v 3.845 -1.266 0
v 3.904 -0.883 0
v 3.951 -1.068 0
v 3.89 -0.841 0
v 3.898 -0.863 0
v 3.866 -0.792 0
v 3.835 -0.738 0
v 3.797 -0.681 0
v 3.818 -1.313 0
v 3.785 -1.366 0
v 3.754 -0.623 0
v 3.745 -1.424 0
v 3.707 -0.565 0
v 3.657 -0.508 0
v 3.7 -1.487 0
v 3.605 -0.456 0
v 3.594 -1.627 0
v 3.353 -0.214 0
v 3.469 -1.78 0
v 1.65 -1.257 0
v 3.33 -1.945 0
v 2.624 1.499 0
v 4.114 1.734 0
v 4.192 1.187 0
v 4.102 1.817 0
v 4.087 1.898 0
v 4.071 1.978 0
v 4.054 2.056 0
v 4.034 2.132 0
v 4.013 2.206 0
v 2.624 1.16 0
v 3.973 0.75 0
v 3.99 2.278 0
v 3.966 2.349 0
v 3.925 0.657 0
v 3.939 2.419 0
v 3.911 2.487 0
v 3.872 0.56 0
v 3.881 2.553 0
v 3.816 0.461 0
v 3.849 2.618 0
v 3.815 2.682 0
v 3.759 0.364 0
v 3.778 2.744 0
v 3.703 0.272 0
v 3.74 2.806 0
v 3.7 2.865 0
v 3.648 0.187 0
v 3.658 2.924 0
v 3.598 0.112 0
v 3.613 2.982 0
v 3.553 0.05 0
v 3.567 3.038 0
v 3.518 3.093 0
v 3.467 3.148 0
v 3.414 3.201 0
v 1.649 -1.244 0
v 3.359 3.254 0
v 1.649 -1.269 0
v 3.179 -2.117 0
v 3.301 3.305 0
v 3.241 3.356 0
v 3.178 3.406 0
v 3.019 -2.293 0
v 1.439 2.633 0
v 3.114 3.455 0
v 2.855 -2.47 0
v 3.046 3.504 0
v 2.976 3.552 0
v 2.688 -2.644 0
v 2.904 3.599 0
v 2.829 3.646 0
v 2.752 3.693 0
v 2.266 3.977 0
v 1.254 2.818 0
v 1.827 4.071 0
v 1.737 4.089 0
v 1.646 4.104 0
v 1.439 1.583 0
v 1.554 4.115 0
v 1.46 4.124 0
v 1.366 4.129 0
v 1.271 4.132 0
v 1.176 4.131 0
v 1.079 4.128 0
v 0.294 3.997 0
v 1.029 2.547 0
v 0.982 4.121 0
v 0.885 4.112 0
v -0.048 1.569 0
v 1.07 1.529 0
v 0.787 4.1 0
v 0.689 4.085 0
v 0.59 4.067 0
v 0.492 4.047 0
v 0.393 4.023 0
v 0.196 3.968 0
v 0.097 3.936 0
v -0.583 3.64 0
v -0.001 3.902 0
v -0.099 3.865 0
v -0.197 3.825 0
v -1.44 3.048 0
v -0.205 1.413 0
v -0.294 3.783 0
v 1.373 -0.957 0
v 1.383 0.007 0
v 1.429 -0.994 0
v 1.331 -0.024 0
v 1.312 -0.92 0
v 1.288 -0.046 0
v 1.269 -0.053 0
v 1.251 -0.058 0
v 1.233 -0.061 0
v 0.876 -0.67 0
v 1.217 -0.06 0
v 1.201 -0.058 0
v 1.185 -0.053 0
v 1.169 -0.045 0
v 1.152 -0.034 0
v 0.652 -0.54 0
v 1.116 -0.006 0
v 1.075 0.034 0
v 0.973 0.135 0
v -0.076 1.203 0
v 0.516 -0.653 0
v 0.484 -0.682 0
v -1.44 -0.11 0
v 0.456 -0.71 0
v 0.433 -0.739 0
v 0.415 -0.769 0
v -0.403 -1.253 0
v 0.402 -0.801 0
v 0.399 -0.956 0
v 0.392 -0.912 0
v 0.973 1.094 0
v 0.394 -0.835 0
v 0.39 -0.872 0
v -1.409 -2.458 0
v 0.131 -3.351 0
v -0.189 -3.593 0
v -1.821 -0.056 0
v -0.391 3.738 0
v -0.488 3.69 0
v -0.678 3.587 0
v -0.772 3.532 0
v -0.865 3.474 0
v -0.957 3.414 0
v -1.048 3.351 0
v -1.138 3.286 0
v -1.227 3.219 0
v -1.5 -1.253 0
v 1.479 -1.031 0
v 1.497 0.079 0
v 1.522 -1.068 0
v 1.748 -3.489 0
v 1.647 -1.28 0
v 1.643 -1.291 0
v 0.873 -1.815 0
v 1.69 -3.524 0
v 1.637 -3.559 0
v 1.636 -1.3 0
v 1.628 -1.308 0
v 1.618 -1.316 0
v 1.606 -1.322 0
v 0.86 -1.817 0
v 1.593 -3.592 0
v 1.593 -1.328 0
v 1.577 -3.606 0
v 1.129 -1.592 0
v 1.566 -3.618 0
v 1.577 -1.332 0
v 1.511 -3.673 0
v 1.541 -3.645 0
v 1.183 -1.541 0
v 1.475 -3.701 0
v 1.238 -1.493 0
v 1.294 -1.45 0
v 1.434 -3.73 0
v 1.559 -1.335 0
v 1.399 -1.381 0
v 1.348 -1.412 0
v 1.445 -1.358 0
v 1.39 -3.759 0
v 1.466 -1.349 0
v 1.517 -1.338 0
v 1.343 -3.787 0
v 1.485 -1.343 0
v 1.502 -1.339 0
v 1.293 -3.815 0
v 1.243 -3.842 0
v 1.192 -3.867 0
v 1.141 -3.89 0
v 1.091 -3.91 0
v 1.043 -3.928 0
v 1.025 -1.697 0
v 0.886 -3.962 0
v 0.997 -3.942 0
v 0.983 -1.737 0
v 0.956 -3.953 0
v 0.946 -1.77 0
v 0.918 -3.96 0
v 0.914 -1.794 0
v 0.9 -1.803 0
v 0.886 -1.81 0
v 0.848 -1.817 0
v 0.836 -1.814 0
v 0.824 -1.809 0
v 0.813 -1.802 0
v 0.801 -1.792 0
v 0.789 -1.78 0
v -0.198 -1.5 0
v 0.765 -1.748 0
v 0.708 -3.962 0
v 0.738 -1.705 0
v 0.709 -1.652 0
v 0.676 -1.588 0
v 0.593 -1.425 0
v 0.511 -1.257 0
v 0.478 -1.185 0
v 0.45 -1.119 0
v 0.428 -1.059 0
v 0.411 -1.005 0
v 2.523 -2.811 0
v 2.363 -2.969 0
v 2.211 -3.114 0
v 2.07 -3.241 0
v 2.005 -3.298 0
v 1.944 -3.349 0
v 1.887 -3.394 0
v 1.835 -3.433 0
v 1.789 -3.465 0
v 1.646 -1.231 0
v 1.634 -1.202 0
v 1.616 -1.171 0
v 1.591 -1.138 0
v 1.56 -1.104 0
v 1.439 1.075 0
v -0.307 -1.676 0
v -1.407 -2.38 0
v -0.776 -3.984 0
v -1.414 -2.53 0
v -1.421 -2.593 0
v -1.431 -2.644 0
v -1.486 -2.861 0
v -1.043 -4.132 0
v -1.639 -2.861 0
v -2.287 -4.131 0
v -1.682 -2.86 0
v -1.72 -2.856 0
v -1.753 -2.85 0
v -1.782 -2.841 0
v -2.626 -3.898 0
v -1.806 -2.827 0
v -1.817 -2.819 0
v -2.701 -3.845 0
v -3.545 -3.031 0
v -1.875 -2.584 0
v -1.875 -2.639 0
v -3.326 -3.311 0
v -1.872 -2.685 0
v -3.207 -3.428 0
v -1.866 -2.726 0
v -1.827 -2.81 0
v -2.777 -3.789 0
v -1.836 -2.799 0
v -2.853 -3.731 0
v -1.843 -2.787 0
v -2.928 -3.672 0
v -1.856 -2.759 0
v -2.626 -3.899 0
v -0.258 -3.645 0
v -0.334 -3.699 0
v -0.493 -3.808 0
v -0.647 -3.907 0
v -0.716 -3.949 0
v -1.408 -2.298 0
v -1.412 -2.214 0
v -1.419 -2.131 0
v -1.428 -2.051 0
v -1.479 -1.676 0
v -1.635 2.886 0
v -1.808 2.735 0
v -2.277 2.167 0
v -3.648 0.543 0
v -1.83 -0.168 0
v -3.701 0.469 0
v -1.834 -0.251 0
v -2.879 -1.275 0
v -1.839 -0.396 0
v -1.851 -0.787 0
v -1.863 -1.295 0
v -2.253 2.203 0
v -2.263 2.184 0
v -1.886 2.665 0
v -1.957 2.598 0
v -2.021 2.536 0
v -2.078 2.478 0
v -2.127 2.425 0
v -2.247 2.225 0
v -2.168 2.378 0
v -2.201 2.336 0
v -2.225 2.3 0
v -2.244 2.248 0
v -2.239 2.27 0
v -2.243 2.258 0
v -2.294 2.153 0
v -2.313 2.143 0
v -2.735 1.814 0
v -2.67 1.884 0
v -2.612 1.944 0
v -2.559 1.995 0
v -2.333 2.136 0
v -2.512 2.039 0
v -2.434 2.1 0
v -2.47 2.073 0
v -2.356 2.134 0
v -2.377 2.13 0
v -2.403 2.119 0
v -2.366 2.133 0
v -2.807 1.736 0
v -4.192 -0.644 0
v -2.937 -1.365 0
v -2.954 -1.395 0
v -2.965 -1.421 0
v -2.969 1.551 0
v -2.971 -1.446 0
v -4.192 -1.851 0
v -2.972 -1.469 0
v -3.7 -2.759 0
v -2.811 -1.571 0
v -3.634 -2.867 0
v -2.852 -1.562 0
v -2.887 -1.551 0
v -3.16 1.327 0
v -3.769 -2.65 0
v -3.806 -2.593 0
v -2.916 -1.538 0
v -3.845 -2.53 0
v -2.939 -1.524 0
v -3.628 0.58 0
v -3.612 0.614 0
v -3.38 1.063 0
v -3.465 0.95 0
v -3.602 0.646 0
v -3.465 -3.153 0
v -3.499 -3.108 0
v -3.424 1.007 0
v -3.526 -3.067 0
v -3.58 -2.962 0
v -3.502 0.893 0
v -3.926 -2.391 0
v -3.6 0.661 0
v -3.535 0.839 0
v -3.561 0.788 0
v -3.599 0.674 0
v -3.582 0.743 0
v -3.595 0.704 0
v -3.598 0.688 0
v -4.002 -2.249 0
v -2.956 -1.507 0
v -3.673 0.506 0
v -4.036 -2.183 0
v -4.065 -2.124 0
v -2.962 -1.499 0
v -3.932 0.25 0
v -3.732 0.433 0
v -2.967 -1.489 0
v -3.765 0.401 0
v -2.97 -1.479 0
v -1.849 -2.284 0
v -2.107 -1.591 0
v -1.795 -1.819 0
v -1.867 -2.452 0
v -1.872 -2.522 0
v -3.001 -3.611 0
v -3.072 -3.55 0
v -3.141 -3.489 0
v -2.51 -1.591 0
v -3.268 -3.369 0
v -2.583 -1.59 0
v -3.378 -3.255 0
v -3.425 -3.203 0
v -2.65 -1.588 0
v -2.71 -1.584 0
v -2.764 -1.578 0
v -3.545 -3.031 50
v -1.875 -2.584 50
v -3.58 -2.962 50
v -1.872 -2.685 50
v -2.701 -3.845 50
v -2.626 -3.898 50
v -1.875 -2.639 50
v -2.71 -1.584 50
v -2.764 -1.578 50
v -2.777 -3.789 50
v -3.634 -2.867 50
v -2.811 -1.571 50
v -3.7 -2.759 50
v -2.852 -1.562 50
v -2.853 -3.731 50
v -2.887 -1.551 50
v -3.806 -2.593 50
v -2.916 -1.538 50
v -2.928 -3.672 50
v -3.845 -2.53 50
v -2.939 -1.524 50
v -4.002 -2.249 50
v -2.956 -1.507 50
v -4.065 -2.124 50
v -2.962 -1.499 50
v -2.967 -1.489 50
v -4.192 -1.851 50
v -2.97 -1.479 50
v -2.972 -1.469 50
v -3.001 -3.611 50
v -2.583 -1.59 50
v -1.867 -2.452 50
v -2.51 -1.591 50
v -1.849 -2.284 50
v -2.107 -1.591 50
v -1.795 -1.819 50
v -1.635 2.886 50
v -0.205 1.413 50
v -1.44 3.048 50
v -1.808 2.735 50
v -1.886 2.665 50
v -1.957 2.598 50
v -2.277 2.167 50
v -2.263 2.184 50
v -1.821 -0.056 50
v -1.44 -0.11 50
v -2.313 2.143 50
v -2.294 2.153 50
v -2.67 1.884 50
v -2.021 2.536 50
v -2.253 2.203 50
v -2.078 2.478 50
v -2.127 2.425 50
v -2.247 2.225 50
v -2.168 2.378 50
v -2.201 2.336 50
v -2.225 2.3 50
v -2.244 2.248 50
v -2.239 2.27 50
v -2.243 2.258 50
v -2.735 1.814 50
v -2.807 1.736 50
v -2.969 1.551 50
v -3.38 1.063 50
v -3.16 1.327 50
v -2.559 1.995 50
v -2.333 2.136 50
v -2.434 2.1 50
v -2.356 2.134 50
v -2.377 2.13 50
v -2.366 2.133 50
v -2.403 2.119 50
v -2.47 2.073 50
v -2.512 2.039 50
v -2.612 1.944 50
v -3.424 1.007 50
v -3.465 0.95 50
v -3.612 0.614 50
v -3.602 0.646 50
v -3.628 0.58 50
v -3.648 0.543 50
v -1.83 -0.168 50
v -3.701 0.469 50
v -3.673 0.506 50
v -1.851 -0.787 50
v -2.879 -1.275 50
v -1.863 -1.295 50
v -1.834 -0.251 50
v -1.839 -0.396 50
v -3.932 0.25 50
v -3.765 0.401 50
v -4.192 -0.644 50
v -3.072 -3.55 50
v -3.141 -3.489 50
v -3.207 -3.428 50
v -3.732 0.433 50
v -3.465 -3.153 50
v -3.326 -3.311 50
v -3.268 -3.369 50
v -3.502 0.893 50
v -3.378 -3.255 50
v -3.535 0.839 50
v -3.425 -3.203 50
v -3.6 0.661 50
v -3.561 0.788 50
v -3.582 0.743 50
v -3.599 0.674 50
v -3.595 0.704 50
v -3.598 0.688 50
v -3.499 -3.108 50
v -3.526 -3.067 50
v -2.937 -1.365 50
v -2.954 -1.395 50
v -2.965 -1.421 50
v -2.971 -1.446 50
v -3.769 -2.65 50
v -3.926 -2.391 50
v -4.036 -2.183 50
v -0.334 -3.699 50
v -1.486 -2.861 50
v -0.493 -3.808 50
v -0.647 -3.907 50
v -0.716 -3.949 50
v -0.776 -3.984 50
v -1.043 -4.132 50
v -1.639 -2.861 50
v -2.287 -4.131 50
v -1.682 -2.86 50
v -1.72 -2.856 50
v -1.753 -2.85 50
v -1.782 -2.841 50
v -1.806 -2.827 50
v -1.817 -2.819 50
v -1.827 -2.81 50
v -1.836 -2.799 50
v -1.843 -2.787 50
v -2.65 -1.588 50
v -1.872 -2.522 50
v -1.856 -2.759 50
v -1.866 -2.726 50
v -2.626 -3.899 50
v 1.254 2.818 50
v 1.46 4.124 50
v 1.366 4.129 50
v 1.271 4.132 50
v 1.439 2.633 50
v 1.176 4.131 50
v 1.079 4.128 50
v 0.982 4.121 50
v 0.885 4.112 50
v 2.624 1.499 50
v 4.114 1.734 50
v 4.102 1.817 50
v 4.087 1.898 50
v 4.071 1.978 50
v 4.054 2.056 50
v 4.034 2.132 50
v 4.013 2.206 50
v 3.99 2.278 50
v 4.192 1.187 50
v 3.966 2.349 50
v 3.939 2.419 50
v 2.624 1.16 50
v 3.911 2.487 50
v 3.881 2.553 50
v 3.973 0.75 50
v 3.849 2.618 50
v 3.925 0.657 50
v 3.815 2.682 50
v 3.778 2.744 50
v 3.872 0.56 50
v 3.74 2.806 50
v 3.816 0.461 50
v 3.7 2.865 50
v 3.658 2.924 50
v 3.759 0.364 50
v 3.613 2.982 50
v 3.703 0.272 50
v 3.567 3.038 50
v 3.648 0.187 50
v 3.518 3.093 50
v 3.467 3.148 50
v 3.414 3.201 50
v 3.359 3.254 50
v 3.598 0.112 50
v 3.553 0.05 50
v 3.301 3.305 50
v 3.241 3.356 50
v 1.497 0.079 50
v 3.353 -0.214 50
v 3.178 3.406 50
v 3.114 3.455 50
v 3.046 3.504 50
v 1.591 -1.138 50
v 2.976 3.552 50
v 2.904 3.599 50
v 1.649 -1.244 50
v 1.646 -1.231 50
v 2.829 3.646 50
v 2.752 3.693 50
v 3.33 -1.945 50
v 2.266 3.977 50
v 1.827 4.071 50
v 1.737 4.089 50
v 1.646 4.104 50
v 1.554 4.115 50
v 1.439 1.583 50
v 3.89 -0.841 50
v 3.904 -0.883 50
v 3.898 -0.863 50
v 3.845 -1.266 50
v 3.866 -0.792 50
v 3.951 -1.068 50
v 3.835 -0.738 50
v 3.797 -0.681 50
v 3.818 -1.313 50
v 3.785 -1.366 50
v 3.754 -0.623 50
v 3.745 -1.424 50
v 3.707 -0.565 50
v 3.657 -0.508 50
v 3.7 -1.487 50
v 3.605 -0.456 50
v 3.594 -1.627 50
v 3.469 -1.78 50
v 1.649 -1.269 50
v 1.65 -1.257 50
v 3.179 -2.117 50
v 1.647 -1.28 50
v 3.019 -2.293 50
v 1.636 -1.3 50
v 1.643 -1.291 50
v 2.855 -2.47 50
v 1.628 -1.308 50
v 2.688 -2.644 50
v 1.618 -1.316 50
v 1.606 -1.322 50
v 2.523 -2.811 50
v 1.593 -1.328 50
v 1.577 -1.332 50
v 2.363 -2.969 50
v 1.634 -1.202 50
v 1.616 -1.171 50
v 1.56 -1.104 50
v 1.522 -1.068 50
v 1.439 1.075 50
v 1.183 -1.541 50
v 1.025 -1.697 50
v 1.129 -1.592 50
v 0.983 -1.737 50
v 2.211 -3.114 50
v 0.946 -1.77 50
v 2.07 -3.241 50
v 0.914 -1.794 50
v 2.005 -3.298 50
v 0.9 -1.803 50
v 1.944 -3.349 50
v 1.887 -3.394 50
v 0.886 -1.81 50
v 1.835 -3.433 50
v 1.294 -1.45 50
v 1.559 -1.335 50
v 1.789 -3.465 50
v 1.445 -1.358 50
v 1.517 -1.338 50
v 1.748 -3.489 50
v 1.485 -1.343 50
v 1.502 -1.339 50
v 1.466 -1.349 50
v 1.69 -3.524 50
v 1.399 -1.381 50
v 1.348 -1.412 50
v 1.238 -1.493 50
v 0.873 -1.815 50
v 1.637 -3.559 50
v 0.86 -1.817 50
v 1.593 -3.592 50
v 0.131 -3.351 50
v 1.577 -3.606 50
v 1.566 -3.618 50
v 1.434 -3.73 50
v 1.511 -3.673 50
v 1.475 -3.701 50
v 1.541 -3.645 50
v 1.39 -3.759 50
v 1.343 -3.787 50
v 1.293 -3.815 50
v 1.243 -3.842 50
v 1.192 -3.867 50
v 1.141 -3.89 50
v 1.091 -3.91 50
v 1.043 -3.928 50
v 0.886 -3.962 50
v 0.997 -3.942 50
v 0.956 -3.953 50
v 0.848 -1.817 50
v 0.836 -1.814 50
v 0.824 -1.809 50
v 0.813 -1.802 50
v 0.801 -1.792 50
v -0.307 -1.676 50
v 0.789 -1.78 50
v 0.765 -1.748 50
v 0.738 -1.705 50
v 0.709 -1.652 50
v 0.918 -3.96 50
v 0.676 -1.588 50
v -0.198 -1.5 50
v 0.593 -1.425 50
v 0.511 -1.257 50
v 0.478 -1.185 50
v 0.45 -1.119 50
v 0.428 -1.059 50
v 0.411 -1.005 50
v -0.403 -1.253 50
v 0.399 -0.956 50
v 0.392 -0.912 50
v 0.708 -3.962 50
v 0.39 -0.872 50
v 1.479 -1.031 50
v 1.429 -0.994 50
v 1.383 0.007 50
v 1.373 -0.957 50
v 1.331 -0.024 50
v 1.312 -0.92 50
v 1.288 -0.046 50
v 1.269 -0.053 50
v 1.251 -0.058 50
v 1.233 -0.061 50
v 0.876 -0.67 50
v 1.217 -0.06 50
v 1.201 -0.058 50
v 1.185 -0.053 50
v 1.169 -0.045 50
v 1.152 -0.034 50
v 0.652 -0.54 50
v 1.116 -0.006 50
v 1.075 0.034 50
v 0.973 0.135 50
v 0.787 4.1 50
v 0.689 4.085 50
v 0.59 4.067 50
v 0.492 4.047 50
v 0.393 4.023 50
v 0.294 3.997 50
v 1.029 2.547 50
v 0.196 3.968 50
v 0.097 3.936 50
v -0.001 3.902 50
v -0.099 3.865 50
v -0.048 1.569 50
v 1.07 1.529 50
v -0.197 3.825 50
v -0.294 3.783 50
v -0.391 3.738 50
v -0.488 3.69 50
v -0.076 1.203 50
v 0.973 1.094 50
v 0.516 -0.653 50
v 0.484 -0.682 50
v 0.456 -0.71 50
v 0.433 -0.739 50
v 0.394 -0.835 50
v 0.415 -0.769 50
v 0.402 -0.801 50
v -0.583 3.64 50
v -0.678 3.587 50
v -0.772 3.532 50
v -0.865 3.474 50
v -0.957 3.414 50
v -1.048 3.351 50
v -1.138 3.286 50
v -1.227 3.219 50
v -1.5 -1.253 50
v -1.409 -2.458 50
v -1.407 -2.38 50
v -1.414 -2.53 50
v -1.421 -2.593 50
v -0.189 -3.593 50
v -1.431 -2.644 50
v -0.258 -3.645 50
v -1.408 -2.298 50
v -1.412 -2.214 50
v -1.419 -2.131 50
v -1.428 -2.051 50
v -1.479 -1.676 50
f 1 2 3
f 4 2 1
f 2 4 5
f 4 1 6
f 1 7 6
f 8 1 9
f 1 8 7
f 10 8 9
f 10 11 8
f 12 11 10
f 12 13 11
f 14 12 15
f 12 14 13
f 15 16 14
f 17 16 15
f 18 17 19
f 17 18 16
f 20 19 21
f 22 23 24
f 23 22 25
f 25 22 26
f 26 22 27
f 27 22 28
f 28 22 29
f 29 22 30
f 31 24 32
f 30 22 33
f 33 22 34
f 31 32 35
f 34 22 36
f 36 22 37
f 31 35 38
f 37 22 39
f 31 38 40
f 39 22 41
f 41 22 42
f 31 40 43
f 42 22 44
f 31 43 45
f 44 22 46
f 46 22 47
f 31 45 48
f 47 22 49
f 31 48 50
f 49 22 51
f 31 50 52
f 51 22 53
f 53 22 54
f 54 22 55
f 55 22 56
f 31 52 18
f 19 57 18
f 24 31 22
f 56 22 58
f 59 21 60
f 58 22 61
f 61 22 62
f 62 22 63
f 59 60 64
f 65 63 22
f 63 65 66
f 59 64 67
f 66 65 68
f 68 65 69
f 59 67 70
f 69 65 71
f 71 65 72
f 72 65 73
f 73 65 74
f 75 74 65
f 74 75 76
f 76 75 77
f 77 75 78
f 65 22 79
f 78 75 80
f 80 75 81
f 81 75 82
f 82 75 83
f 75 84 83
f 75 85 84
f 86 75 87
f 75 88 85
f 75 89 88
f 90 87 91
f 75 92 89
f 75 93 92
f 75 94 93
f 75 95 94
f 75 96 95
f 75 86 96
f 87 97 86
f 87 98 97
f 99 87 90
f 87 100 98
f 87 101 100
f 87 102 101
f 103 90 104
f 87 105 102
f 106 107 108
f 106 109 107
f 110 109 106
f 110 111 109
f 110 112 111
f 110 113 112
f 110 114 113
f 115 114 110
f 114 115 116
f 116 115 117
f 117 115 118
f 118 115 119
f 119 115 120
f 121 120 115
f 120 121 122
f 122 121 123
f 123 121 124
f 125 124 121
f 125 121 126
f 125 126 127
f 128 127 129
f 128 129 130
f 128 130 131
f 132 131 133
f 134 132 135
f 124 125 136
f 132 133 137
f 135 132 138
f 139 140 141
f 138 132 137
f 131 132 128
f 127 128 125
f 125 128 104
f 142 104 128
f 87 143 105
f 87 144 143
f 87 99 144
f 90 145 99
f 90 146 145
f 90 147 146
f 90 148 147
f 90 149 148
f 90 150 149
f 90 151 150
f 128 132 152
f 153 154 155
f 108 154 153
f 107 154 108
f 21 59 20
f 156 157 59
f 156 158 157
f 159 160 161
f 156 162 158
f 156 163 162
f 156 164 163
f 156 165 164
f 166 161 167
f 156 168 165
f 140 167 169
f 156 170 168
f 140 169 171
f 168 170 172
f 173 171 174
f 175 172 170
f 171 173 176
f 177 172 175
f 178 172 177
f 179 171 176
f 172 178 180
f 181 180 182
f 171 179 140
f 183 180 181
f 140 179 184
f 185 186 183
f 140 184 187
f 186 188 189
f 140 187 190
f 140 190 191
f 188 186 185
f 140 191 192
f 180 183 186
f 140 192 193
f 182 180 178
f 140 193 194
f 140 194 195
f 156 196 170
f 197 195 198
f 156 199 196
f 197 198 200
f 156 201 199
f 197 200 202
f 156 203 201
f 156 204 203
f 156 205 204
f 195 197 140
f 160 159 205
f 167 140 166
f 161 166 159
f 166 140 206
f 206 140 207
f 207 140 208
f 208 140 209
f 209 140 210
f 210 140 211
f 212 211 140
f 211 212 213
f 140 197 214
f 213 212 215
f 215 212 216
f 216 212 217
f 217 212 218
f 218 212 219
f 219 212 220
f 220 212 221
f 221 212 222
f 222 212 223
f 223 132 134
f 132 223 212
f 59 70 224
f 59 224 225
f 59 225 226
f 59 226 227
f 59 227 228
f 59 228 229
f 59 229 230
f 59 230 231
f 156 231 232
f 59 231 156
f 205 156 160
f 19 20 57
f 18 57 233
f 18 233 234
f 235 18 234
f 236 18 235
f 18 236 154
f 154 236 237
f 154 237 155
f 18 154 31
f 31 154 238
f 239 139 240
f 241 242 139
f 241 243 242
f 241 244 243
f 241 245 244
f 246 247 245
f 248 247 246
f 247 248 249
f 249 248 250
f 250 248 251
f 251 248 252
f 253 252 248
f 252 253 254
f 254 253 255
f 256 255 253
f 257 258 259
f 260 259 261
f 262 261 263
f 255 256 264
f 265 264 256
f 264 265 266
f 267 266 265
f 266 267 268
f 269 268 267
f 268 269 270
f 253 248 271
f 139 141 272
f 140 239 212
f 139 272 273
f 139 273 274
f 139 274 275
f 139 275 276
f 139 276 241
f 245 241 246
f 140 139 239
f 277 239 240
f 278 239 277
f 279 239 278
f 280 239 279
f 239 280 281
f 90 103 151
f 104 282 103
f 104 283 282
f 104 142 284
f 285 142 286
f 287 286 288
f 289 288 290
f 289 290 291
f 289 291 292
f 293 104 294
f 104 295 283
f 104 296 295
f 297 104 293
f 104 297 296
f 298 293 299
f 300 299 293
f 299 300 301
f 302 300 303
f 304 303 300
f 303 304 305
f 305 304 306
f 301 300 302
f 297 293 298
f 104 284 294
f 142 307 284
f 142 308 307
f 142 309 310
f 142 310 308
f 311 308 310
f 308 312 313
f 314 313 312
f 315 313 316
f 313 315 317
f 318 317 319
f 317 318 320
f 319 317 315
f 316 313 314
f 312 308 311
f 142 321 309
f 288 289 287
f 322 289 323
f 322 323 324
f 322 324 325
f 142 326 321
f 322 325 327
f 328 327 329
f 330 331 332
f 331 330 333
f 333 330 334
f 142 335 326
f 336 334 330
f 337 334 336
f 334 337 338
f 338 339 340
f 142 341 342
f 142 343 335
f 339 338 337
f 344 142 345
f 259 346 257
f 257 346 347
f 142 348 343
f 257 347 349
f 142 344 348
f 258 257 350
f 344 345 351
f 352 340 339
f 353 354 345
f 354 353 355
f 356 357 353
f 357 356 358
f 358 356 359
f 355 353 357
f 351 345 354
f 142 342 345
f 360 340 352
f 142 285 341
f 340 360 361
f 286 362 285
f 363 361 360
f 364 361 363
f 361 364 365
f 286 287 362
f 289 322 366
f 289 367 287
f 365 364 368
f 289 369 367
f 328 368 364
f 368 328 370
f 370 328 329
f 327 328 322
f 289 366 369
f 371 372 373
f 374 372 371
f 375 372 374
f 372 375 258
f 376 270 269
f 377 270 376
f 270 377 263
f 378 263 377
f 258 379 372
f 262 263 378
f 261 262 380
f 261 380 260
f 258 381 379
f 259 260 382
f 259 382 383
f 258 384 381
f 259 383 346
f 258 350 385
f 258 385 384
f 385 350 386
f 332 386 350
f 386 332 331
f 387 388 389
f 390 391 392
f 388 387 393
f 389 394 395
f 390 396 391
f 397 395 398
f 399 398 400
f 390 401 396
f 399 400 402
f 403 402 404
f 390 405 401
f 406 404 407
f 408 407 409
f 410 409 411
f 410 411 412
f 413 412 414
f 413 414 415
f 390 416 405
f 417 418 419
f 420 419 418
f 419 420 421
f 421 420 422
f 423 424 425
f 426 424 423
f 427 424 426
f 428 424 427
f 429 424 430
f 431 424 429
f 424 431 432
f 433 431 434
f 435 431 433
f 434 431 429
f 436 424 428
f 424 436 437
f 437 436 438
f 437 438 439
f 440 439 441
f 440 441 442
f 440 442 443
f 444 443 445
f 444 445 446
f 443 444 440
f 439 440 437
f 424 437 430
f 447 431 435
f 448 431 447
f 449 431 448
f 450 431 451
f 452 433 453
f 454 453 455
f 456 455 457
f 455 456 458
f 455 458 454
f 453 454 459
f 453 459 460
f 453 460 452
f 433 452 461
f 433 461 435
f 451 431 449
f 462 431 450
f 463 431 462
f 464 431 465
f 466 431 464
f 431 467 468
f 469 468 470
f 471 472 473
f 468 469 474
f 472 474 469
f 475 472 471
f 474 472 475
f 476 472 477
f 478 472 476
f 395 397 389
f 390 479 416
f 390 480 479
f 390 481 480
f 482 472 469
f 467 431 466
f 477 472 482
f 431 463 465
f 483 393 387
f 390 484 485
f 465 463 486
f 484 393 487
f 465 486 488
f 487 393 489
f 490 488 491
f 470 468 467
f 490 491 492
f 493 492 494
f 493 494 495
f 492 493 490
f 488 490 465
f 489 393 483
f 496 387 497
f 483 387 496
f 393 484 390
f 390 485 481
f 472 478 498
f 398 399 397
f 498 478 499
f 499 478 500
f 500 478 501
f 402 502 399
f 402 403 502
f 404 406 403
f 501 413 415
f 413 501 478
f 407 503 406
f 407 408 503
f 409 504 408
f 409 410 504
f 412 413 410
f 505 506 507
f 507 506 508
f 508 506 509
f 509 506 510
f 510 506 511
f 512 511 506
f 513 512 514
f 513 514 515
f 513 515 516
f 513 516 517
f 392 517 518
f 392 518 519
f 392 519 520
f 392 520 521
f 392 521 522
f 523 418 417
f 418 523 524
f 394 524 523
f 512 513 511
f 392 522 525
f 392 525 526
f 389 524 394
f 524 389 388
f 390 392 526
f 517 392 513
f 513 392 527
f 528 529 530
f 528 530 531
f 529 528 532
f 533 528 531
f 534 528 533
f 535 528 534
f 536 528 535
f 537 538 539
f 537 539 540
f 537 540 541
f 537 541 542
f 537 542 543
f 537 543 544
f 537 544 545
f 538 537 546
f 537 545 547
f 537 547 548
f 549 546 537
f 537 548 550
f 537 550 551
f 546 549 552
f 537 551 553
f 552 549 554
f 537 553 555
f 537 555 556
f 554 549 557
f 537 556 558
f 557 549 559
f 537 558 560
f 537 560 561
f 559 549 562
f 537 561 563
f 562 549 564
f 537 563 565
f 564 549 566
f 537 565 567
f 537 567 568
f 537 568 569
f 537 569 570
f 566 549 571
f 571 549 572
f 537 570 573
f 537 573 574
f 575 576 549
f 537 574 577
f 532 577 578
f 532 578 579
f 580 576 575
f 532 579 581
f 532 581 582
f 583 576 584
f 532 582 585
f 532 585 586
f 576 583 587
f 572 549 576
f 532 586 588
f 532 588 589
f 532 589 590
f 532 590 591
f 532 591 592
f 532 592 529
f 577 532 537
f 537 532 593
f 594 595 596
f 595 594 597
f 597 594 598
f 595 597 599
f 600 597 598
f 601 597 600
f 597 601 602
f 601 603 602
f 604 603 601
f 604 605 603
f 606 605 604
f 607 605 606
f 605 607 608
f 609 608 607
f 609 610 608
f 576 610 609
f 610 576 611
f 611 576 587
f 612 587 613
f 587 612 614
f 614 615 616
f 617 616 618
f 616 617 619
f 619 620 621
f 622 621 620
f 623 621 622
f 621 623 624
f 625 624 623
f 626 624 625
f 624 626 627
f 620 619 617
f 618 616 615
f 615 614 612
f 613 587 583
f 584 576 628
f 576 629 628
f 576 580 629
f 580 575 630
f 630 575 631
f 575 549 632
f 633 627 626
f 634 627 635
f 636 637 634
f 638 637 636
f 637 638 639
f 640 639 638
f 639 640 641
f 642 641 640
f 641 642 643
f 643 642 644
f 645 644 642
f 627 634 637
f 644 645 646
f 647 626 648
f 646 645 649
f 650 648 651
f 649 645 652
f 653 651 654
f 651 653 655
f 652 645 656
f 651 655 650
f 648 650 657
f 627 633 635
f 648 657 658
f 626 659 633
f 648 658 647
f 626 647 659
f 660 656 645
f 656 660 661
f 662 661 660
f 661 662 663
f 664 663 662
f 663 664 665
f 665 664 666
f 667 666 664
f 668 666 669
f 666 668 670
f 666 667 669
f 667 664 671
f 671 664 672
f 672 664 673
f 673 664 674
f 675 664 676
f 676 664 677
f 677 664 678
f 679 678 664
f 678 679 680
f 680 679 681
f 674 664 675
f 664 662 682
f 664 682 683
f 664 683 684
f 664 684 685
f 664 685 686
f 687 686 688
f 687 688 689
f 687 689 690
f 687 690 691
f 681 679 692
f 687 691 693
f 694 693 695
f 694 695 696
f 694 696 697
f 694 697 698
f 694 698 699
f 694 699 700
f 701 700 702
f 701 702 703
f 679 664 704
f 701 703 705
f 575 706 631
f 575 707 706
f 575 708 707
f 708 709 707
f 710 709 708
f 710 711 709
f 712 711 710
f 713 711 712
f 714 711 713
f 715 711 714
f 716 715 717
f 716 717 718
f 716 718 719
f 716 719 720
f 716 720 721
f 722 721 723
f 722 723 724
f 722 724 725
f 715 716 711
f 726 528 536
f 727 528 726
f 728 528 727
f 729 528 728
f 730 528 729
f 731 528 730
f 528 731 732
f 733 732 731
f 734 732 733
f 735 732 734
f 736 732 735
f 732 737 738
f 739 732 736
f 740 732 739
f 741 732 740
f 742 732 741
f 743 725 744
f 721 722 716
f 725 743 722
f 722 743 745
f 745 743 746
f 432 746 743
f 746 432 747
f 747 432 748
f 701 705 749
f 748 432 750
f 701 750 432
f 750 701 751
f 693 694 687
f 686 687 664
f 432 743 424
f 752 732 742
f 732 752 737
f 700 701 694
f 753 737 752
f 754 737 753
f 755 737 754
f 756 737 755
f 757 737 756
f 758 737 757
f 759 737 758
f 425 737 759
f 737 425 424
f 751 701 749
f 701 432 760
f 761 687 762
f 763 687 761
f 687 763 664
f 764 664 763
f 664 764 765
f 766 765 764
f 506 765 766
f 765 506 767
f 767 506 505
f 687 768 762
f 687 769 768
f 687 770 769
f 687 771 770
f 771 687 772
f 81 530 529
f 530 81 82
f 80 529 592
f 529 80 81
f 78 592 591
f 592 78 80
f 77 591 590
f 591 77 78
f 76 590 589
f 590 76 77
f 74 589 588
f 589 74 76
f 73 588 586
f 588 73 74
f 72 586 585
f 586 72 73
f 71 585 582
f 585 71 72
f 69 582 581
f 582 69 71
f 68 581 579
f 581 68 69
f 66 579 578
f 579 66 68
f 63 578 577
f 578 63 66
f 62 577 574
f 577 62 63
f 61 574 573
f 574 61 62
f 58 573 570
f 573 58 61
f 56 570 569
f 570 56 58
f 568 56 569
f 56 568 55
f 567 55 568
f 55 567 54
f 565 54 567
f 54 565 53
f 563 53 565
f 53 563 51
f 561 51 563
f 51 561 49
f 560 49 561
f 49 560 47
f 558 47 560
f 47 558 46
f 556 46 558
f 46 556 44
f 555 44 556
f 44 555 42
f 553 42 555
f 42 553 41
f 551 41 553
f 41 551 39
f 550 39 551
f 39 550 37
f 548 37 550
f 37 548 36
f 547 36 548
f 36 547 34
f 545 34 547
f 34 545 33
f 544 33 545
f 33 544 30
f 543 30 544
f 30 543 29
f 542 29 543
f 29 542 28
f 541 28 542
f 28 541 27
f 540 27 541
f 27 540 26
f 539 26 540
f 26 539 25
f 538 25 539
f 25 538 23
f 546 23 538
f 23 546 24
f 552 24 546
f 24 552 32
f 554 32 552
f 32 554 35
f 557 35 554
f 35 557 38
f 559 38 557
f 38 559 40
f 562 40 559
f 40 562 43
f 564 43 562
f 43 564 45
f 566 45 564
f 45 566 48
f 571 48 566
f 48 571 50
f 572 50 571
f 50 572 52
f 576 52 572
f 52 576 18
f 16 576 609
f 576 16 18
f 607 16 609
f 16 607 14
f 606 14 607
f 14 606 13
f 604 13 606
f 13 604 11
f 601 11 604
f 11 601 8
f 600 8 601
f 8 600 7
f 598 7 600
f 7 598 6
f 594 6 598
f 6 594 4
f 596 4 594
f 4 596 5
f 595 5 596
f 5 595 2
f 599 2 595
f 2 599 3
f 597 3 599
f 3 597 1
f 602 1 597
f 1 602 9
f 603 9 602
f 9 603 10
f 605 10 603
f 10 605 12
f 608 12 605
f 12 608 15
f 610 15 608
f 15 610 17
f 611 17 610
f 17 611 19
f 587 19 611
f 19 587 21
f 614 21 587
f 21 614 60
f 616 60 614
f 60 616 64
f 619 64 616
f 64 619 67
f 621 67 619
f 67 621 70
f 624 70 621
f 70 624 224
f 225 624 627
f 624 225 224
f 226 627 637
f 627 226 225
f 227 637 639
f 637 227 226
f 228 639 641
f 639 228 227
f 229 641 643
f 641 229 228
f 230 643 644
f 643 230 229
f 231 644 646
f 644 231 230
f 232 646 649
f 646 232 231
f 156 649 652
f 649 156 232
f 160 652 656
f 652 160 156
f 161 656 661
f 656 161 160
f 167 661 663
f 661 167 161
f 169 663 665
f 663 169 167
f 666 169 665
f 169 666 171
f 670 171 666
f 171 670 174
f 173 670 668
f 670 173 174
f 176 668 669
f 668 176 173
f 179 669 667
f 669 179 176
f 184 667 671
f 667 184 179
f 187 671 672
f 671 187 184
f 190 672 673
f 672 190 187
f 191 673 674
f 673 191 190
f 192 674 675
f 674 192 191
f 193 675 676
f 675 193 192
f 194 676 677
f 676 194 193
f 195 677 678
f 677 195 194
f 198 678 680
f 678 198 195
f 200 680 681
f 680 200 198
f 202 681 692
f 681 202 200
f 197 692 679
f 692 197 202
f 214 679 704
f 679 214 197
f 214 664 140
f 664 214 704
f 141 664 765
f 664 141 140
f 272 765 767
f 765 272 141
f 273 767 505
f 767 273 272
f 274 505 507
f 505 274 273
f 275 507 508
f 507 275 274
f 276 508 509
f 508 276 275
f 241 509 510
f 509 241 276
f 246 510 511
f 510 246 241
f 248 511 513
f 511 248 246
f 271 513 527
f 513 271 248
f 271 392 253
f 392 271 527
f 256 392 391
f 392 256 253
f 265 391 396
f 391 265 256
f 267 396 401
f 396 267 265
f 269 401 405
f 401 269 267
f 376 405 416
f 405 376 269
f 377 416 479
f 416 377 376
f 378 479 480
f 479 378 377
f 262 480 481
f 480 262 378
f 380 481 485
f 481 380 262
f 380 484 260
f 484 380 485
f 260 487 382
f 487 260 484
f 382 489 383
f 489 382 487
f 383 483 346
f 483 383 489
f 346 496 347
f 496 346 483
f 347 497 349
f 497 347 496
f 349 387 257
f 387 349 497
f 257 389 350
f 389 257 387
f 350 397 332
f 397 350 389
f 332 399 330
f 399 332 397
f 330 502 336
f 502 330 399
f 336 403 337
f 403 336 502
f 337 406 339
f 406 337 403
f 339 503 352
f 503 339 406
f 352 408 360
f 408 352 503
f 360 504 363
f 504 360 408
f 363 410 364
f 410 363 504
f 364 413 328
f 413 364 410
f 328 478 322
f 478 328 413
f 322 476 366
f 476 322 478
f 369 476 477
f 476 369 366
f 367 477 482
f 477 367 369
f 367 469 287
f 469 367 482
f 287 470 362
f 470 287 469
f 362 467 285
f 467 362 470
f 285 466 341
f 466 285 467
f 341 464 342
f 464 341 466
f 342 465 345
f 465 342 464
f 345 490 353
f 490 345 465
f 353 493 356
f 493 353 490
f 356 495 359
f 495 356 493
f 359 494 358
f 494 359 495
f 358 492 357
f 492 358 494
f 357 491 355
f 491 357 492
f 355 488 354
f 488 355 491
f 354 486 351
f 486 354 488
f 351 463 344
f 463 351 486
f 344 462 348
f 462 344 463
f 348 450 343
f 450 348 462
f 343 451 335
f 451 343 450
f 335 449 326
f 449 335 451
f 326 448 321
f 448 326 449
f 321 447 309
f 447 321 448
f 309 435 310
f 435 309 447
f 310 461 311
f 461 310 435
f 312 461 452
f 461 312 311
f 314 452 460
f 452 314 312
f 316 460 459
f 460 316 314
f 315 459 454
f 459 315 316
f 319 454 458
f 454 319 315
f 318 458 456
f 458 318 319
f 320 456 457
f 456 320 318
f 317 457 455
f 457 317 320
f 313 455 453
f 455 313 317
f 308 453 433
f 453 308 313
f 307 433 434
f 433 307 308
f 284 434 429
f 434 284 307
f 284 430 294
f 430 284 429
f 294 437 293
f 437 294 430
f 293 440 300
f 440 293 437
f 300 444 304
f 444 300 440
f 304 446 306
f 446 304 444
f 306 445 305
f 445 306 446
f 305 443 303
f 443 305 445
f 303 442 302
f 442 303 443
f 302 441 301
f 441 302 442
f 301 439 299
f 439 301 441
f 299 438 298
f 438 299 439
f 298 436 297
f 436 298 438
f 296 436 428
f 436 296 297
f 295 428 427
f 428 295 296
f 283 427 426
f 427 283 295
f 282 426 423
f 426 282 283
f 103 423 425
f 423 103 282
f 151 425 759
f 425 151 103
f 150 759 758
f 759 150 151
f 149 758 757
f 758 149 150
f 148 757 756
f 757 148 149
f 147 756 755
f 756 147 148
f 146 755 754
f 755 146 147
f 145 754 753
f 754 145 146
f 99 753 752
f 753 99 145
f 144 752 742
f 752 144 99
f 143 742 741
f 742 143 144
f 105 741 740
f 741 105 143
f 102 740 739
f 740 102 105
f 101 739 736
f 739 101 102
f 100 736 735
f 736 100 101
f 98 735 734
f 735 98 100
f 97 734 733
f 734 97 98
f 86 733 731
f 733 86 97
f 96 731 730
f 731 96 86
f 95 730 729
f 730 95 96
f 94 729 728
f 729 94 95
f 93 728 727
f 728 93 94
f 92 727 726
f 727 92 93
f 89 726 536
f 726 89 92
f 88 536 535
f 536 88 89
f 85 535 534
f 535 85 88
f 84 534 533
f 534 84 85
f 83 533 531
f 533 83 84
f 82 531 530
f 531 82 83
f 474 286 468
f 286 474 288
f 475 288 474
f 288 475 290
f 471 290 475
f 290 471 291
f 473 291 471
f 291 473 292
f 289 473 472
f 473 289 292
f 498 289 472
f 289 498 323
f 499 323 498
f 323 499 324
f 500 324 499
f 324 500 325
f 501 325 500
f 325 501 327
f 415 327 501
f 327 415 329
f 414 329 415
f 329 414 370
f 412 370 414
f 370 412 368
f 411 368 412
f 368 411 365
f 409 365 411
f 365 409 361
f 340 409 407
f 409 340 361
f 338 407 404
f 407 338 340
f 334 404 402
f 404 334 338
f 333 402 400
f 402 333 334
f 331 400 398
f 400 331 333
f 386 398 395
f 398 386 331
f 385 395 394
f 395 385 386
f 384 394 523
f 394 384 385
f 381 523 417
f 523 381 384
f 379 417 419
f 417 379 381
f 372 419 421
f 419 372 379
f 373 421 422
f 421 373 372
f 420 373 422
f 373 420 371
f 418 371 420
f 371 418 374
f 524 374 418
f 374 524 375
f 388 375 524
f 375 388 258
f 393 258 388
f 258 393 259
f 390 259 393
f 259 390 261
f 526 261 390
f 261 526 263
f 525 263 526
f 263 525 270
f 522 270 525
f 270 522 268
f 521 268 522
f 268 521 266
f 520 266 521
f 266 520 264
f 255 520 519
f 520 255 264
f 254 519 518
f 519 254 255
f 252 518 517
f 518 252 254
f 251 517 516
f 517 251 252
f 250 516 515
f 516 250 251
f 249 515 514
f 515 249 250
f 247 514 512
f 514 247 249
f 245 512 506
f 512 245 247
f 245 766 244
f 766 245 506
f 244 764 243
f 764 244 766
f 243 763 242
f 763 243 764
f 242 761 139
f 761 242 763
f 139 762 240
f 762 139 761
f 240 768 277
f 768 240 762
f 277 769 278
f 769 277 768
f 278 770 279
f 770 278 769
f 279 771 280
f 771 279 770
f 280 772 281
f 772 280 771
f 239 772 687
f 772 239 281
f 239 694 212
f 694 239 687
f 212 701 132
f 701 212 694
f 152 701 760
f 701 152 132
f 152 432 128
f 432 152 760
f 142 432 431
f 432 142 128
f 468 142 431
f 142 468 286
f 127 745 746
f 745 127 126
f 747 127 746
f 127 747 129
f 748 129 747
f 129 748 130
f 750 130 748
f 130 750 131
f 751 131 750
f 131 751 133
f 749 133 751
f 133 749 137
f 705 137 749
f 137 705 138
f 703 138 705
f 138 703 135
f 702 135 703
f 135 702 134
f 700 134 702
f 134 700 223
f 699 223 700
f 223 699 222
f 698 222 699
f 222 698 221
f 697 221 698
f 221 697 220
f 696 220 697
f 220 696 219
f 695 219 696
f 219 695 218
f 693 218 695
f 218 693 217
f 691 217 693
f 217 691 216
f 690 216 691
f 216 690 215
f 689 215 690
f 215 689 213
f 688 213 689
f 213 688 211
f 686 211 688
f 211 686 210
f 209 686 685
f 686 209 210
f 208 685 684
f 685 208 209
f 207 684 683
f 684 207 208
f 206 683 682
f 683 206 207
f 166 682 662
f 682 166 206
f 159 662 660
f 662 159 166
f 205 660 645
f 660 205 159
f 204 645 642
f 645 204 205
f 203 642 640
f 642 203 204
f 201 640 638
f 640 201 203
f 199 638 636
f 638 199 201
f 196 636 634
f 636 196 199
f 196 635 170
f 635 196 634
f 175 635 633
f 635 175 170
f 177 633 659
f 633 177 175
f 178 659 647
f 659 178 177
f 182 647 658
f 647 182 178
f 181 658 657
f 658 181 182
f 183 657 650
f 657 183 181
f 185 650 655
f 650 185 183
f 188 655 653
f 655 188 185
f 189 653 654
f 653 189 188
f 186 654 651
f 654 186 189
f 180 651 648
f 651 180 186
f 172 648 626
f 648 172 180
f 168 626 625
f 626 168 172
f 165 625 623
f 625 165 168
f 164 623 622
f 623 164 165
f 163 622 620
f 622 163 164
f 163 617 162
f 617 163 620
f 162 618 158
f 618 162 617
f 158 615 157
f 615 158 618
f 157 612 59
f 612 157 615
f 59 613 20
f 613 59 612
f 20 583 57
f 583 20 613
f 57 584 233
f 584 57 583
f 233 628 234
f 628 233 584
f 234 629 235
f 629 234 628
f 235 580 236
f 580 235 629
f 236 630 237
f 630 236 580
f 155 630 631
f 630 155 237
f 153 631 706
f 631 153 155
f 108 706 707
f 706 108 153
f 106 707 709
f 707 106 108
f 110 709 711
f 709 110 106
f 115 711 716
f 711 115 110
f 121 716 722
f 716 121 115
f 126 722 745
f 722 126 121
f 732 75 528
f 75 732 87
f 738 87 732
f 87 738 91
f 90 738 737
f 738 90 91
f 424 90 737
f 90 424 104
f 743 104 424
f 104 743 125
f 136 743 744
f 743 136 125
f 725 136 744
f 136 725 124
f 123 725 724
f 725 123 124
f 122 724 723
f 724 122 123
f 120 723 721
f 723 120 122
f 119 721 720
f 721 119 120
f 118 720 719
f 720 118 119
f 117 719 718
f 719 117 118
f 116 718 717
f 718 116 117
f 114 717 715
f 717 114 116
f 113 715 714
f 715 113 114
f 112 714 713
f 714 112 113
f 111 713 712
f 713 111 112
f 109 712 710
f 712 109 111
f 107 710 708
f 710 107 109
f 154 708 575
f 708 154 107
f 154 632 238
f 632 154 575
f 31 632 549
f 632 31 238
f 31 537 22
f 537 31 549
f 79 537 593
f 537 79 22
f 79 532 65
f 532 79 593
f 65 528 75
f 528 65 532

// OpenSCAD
// Generated by inkscape None + inkscape-paths2openscad 0.27
// Sat Sep 26 10:11:36 2020 from "inkscape.svg"

// Module names are of the form poly_<inkscape-path-id>().  As a result,
// you can associate a polygon in this OpenSCAD program with the corresponding
// SVG element in the Inkscape document by looking for the XML element with
// the attribute id="inkscape-path-id".

// fudge value is used to ensure that subtracted solids are a tad taller
// in the z dimension than the polygon being subtracted from.  This helps
// keep the resulting .stl file manifold.
fudge = 0.1;
user_unit_scale_x = 1.0;
user_unit_scale_y = 1.0;
custom_scale_x = 1;
custom_scale_y = 1;
zsize = 50;
line_fn = 16;
min_line_width = 1.0;
line_width_scale = 1.0;
function min_line_mm(w) = max(min_line_width, w * line_width_scale) * 1;


path971_0_center = [0.000000,0.000000];
path971_0_points = [[-2.625735,3.898504],[-2.701427,3.845299],[-2.777402,3.789395],[-2.853079,3.731343],[-2.927875,3.671690],[-3.001208,3.610988],[-3.072497,3.549784],[-3.141158,3.488629],[-3.206611,3.428070],[-3.268273,3.368659],[-3.325562,3.310943],[-3.377897,3.255473],[-3.424694,3.202797],[-3.465372,3.153465],[-3.499350,3.108026],[-3.526044,3.067029],[-3.544874,3.031024],[-3.579933,2.961691],[-3.633967,2.866737],[-3.699606,2.758676],[-3.769483,2.650024],[-3.805935,2.593440],[-3.844946,2.529903],[-3.925796,2.390607],[-4.002339,2.249409],[-4.035967,2.183495],[-4.064884,2.123584],[-4.191708,1.851134],[-4.191708,1.247614],[-4.191708,0.644090],[-4.061732,0.196988],[-3.931756,-0.250114],[-3.765398,-0.400665],[-3.731979,-0.433413],[-3.700803,-0.468811],[-3.672551,-0.505737],[-3.647907,-0.543070],[-3.627551,-0.579687],[-3.612167,-0.614469],[-3.602436,-0.646293],[-3.599904,-0.660746],[-3.599041,-0.674039],[-3.597902,-0.687931],[-3.594563,-0.704144],[-3.581730,-0.742734],[-3.561442,-0.788213],[-3.534597,-0.838984],[-3.502097,-0.893452],[-3.464840,-0.950022],[-3.423727,-1.007098],[-3.379656,-1.063083],[-3.159823,-1.327475],[-2.969391,-1.551259],[-2.806782,-1.736086],[-2.735418,-1.814406],[-2.670417,-1.883606],[-2.611583,-1.943893],[-2.558718,-1.995471],[-2.511624,-2.038549],[-2.470105,-2.073331],[-2.433963,-2.100025],[-2.403001,-2.118836],[-2.377021,-2.129972],[-2.365838,-2.132726],[-2.355826,-2.133638],[-2.333438,-2.135966],[-2.312551,-2.142637],[-2.293624,-2.153184],[-2.277113,-2.167139],[-2.263475,-2.184035],[-2.253168,-2.203403],[-2.246648,-2.224776],[-2.244373,-2.247687],[-2.243132,-2.258151],[-2.239439,-2.270355],[-2.224891,-2.299800],[-2.201115,-2.335656],[-2.168492,-2.377556],[-2.127408,-2.425134],[-2.078246,-2.478025],[-2.021390,-2.535861],[-1.957224,-2.598277],[-1.886131,-2.664907],[-1.808495,-2.735384],[-1.635131,-2.886417],[-1.440201,-3.048445],[-1.226776,-3.218540],[-1.138062,-3.286146],[-1.048137,-3.351327],[-0.957080,-3.414060],[-0.864969,-3.474325],[-0.771881,-3.532099],[-0.677894,-3.587361],[-0.583085,-3.640090],[-0.487532,-3.690263],[-0.391313,-3.737859],[-0.294505,-3.782856],[-0.197185,-3.825233],[-0.099432,-3.864968],[-0.001323,-3.902039],[0.097065,-3.936424],[0.195653,-3.968102],[0.294365,-3.997052],[0.393122,-4.023251],[0.491847,-4.046678],[0.590463,-4.067311],[0.688892,-4.085128],[0.787056,-4.100108],[0.884877,-4.112230],[0.982278,-4.121471],[1.079182,-4.127810],[1.175511,-4.131225],[1.271187,-4.131694],[1.366132,-4.129196],[1.460270,-4.123710],[1.553522,-4.115212],[1.645810,-4.103683],[1.737058,-4.089100],[1.827187,-4.071441],[2.266407,-3.977241],[2.751947,-3.692673],[2.829325,-3.646331],[2.904139,-3.599487],[2.976421,-3.552096],[3.046202,-3.504113],[3.113515,-3.455491],[3.178391,-3.406184],[3.240863,-3.356148],[3.300962,-3.305335],[3.358720,-3.253701],[3.414169,-3.201199],[3.467340,-3.147783],[3.518266,-3.093409],[3.566979,-3.038029],[3.613510,-2.981599],[3.657891,-2.924072],[3.700154,-2.865403],[3.740331,-2.805546],[3.778453,-2.744454],[3.814553,-2.682083],[3.848663,-2.618387],[3.880814,-2.553319],[3.911038,-2.486834],[3.939367,-2.418886],[3.965832,-2.349429],[3.990467,-2.278418],[4.013302,-2.205806],[4.034369,-2.131549],[4.053701,-2.055599],[4.071329,-1.977912],[4.087285,-1.898441],[4.101600,-1.817141],[4.114307,-1.733966],[4.191707,-1.187393],[3.972647,-0.750347],[3.924552,-0.657173],[3.871772,-0.559848],[3.816029,-0.461247],[3.759044,-0.364243],[3.702537,-0.271709],[3.648230,-0.186521],[3.597843,-0.111551],[3.553097,-0.049673],[3.352597,0.213956],[3.605217,0.455981],[3.656911,0.508374],[3.706968,0.564549],[3.754162,0.622756],[3.797266,0.681243],[3.835055,0.738259],[3.866300,0.792052],[3.889777,0.840872],[3.898218,0.862869],[3.904257,0.882966],[3.950657,1.067924],[3.845197,1.266314],[3.818383,1.313335],[3.784979,1.366141],[3.745395,1.424298],[3.700041,1.487372],[3.593655,1.626537],[3.469095,1.780169],[3.329633,1.944797],[3.178540,2.116954],[3.019090,2.293170],[2.854554,2.469978],[2.688205,2.643908],[2.523316,2.811491],[2.363158,2.969259],[2.211004,3.113743],[2.070127,3.241474],[2.004940,3.297973],[1.943799,3.348984],[1.887113,3.394072],[1.835291,3.432803],[1.788743,3.464745],[1.747878,3.489464],[1.690186,3.523600],[1.636592,3.559290],[1.593072,3.592305],[1.576956,3.606487],[1.565597,3.618414],[1.541134,3.644875],[1.510528,3.672564],[1.474580,3.701077],[1.434092,3.730008],[1.389864,3.758952],[1.342697,3.787504],[1.293392,3.815259],[1.242749,3.841813],[1.191569,3.866759],[1.140654,3.889693],[1.090804,3.910211],[1.042820,3.927906],[0.997502,3.942374],[0.955652,3.953209],[0.918070,3.960008],[0.885557,3.962364],[0.707557,3.962364],[0.419457,3.656894],[0.131367,3.351424],[-0.188682,3.593394],[-0.258424,3.645024],[-0.334025,3.699037],[-0.493169,3.807810],[-0.646849,3.906910],[-0.715620,3.948832],[-0.775802,3.983534],[-1.042863,4.131694],[-1.664800,4.131364],[-2.286738,4.131024],[-2.625765,3.898554],[-2.625735,3.898504],[-1.430969,2.644024],[-1.421043,2.592645],[-1.413811,2.529916],[-1.409289,2.458271],[-1.407487,2.380138],[-1.408421,2.297949],[-1.412104,2.214135],[-1.418548,2.131126],[-1.427768,2.051354],[-1.479169,1.676364],[-0.893118,1.676364],[-0.307062,1.676364],[-0.252462,1.587964],[-0.197862,1.499564],[-0.300192,1.376274],[-0.402512,1.252984],[-0.951139,1.252984],[-1.499763,1.252984],[-1.469943,0.681479],[-1.440123,0.109979],[-1.630623,0.082919],[-1.821123,0.055869],[-1.829723,0.167591],[-1.834043,0.251056],[-1.839483,0.395721],[-1.850893,0.787313],[-1.863433,1.295314],[-2.371432,1.285314],[-2.879432,1.275314],[-2.937342,1.365414],[-2.954110,1.394501],[-2.965506,1.421361],[-2.971441,1.446041],[-2.971821,1.468589],[-2.969899,1.479080],[-2.966554,1.489056],[-2.961775,1.498523],[-2.955549,1.507488],[-2.938713,1.523934],[-2.915954,1.538444],[-2.887181,1.551065],[-2.852300,1.561846],[-2.811221,1.570835],[-2.763850,1.578081],[-2.710096,1.583633],[-2.649867,1.587538],[-2.583071,1.589846],[-2.509614,1.590604],[-2.107461,1.590604],[-1.951130,1.704914],[-1.794799,1.819224],[-1.849459,2.284294],[-1.867082,2.452041],[-1.872376,2.522409],[-1.875081,2.584440],[-1.875016,2.638636],[-1.871997,2.685494],[-1.865844,2.725517],[-1.856372,2.759203],[-1.843400,2.787053],[-1.835544,2.798946],[-1.826745,2.809567],[-1.816979,2.818980],[-1.806225,2.827246],[-1.781657,2.840588],[-1.752860,2.850095],[-1.719650,2.856267],[-1.681846,2.859603],[-1.639265,2.860604],[-1.485655,2.860604],[-1.430969,2.644024],[1.129267,1.591694],[1.183016,1.540671],[1.238426,1.493071],[1.293908,1.449935],[1.347874,1.412307],[1.398733,1.381226],[1.444896,1.357736],[1.465720,1.349163],[1.484774,1.342878],[1.501859,1.339012],[1.516778,1.337694],[1.558728,1.335152],[1.576639,1.332044],[1.592537,1.327770],[1.606446,1.322378],[1.618387,1.315913],[1.628382,1.308420],[1.636454,1.299945],[1.642626,1.290534],[1.646920,1.280232],[1.649358,1.269084],[1.649963,1.257137],[1.648758,1.244436],[1.645764,1.231026],[1.634500,1.202264],[1.616352,1.171215],[1.591499,1.138245],[1.560121,1.103717],[1.522397,1.067997],[1.478506,1.031450],[1.428628,0.994441],[1.372942,0.957333],[1.311628,0.920493],[0.875917,0.669994],[0.651877,0.540363],[0.516087,0.653062],[0.483813,0.681569],[0.456219,0.710047],[0.433364,0.739065],[0.415303,0.769195],[0.402094,0.801007],[0.393795,0.835072],[0.390462,0.871961],[0.392152,0.912244],[0.398924,0.956491],[0.410833,1.005274],[0.427938,1.059163],[0.450295,1.118729],[0.477961,1.184542],[0.510994,1.257174],[0.593387,1.425174],[0.675541,1.587928],[0.708899,1.652204],[0.738361,1.705467],[0.764865,1.748009],[0.789347,1.780121],[0.801124,1.792356],[0.812747,1.802094],[0.824333,1.809370],[0.836000,1.814220],[0.847865,1.816682],[0.860045,1.816791],[0.872657,1.814584],[0.885819,1.810097],[0.899647,1.803367],[0.914259,1.794430],[0.946303,1.770081],[0.982888,1.737341],[1.024953,1.696503],[1.129267,1.591694],[1.129267,1.591694],[1.383377,-0.007200],[1.497467,-0.079500],[1.468068,-0.577401],[1.438668,-1.075303],[2.031328,-1.117633],[2.623998,-1.159963],[2.623998,-1.329296],[2.623998,-1.498629],[2.031328,-1.540959],[1.438668,-1.583289],[1.438668,-2.108195],[1.438668,-2.633100],[1.346168,-2.725620],[1.253668,-2.818140],[1.141118,-2.682525],[1.028568,-2.546911],[1.049368,-2.037876],[1.070167,-1.528842],[0.510877,-1.549112],[-0.048413,-1.569392],[-0.126813,-1.490972],[-0.205213,-1.412552],[-0.140513,-1.307846],[-0.075813,-1.203139],[0.448617,-1.148329],[0.973047,-1.093519],[0.973047,-0.614513],[0.973047,-0.135508],[1.074647,-0.033908],[1.116062,0.005560],[1.152054,0.034305],[1.168738,0.044720],[1.184933,0.052528],[1.200927,0.057757],[1.217009,0.060429],[1.233467,0.060571],[1.250591,0.058207],[1.268668,0.053362],[1.287988,0.046062],[1.331511,0.024194],[1.383467,-0.007198],[1.383377,-0.007200]];
path971_0_paths = [[0,1,2,3,4,5,6,7,8,9,10,11,12,13,14,15,16,17,18,19,20,21,22,23,24,25,26,27,28,29,30,31,32,33,34,35,36,37,38,39,40,41,42,43,44,45,46,47,48,49,50,51,52,53,54,55,56,57,58,59,60,61,62,63,64,65,66,67,68,69,70,71,72,73,74,75,76,77,78,79,80,81,82,83,84,85,86,87,88,89,90,91,92,93,94,95,96,97,98,99,100,101,102,103,104,105,106,107,108,109,110,111,112,113,114,115,116,117,118,119,120,121,122,123,124,125,126,127,128,129,130,131,132,133,134,135,136,137,138,139,140,141,142,143,144,145,146,147,148,149,150,151,152,153,154,155,156,157,158,159,160,161,162,163,164,165,166,167,168,169,170,171,172,173,174,175,176,177,178,179,180,181,182,183,184,185,186,187,188,189,190,191,192,193,194,195,196,197,198,199,200,201,202,203,204,205,206,207,208,209,210,211,212,213,214,215,216,217,218,219,220,221,222,223,224,225,226,227,228,229,230,231,232],
				[233,234,235,236,237,238,239,240,241,242,243,244,245,246,247,248,249,250,251,252,253,254,255,256,257,258,259,260,261,262,263,264,265,266,267,268,269,270,271,272,273,274,275,276,277,278,279,280,281,282,283,284,285,286,287,288,289,290,291,292,293,294,295,296,297,298,299,300,301,302,303],
				[304,305,306,307,308,309,310,311,312,313,314,315,316,317,318,319,320,321,322,323,324,325,326,327,328,329,330,331,332,333,334,335,336,337,338,339,340,341,342,343,344,345,346,347,348,349,350,351,352,353,354,355,356,357,358,359,360,361,362,363,364,365,366,367,368,369,370,371,372,373,374],
				[375,376,377,378,379,380,381,382,383,384,385,386,387,388,389,390,391,392,393,394,395,396,397,398,399,400,401,402,403,404,405,406,407,408,409,410,411,412,413,414,415,416]];
module poly_path971(h, w, s, res=line_fn)
{
  scale([custom_scale_x, -custom_scale_y, 1]) union()
  {
    translate (path971_0_center) linear_extrude(height=h, convexity=10, scale=0.01*s)
      translate (-path971_0_center) polygon(path971_0_points, path971_0_paths);
  }
}

module poison(h)
{
  difference()
  {
    union()
    {
      translate ([0,0,0]) poly_path971(h, min_line_mm(0.999998), 100.0);
    }
    union()
    {
    }
  }
}

poison(zsize);
